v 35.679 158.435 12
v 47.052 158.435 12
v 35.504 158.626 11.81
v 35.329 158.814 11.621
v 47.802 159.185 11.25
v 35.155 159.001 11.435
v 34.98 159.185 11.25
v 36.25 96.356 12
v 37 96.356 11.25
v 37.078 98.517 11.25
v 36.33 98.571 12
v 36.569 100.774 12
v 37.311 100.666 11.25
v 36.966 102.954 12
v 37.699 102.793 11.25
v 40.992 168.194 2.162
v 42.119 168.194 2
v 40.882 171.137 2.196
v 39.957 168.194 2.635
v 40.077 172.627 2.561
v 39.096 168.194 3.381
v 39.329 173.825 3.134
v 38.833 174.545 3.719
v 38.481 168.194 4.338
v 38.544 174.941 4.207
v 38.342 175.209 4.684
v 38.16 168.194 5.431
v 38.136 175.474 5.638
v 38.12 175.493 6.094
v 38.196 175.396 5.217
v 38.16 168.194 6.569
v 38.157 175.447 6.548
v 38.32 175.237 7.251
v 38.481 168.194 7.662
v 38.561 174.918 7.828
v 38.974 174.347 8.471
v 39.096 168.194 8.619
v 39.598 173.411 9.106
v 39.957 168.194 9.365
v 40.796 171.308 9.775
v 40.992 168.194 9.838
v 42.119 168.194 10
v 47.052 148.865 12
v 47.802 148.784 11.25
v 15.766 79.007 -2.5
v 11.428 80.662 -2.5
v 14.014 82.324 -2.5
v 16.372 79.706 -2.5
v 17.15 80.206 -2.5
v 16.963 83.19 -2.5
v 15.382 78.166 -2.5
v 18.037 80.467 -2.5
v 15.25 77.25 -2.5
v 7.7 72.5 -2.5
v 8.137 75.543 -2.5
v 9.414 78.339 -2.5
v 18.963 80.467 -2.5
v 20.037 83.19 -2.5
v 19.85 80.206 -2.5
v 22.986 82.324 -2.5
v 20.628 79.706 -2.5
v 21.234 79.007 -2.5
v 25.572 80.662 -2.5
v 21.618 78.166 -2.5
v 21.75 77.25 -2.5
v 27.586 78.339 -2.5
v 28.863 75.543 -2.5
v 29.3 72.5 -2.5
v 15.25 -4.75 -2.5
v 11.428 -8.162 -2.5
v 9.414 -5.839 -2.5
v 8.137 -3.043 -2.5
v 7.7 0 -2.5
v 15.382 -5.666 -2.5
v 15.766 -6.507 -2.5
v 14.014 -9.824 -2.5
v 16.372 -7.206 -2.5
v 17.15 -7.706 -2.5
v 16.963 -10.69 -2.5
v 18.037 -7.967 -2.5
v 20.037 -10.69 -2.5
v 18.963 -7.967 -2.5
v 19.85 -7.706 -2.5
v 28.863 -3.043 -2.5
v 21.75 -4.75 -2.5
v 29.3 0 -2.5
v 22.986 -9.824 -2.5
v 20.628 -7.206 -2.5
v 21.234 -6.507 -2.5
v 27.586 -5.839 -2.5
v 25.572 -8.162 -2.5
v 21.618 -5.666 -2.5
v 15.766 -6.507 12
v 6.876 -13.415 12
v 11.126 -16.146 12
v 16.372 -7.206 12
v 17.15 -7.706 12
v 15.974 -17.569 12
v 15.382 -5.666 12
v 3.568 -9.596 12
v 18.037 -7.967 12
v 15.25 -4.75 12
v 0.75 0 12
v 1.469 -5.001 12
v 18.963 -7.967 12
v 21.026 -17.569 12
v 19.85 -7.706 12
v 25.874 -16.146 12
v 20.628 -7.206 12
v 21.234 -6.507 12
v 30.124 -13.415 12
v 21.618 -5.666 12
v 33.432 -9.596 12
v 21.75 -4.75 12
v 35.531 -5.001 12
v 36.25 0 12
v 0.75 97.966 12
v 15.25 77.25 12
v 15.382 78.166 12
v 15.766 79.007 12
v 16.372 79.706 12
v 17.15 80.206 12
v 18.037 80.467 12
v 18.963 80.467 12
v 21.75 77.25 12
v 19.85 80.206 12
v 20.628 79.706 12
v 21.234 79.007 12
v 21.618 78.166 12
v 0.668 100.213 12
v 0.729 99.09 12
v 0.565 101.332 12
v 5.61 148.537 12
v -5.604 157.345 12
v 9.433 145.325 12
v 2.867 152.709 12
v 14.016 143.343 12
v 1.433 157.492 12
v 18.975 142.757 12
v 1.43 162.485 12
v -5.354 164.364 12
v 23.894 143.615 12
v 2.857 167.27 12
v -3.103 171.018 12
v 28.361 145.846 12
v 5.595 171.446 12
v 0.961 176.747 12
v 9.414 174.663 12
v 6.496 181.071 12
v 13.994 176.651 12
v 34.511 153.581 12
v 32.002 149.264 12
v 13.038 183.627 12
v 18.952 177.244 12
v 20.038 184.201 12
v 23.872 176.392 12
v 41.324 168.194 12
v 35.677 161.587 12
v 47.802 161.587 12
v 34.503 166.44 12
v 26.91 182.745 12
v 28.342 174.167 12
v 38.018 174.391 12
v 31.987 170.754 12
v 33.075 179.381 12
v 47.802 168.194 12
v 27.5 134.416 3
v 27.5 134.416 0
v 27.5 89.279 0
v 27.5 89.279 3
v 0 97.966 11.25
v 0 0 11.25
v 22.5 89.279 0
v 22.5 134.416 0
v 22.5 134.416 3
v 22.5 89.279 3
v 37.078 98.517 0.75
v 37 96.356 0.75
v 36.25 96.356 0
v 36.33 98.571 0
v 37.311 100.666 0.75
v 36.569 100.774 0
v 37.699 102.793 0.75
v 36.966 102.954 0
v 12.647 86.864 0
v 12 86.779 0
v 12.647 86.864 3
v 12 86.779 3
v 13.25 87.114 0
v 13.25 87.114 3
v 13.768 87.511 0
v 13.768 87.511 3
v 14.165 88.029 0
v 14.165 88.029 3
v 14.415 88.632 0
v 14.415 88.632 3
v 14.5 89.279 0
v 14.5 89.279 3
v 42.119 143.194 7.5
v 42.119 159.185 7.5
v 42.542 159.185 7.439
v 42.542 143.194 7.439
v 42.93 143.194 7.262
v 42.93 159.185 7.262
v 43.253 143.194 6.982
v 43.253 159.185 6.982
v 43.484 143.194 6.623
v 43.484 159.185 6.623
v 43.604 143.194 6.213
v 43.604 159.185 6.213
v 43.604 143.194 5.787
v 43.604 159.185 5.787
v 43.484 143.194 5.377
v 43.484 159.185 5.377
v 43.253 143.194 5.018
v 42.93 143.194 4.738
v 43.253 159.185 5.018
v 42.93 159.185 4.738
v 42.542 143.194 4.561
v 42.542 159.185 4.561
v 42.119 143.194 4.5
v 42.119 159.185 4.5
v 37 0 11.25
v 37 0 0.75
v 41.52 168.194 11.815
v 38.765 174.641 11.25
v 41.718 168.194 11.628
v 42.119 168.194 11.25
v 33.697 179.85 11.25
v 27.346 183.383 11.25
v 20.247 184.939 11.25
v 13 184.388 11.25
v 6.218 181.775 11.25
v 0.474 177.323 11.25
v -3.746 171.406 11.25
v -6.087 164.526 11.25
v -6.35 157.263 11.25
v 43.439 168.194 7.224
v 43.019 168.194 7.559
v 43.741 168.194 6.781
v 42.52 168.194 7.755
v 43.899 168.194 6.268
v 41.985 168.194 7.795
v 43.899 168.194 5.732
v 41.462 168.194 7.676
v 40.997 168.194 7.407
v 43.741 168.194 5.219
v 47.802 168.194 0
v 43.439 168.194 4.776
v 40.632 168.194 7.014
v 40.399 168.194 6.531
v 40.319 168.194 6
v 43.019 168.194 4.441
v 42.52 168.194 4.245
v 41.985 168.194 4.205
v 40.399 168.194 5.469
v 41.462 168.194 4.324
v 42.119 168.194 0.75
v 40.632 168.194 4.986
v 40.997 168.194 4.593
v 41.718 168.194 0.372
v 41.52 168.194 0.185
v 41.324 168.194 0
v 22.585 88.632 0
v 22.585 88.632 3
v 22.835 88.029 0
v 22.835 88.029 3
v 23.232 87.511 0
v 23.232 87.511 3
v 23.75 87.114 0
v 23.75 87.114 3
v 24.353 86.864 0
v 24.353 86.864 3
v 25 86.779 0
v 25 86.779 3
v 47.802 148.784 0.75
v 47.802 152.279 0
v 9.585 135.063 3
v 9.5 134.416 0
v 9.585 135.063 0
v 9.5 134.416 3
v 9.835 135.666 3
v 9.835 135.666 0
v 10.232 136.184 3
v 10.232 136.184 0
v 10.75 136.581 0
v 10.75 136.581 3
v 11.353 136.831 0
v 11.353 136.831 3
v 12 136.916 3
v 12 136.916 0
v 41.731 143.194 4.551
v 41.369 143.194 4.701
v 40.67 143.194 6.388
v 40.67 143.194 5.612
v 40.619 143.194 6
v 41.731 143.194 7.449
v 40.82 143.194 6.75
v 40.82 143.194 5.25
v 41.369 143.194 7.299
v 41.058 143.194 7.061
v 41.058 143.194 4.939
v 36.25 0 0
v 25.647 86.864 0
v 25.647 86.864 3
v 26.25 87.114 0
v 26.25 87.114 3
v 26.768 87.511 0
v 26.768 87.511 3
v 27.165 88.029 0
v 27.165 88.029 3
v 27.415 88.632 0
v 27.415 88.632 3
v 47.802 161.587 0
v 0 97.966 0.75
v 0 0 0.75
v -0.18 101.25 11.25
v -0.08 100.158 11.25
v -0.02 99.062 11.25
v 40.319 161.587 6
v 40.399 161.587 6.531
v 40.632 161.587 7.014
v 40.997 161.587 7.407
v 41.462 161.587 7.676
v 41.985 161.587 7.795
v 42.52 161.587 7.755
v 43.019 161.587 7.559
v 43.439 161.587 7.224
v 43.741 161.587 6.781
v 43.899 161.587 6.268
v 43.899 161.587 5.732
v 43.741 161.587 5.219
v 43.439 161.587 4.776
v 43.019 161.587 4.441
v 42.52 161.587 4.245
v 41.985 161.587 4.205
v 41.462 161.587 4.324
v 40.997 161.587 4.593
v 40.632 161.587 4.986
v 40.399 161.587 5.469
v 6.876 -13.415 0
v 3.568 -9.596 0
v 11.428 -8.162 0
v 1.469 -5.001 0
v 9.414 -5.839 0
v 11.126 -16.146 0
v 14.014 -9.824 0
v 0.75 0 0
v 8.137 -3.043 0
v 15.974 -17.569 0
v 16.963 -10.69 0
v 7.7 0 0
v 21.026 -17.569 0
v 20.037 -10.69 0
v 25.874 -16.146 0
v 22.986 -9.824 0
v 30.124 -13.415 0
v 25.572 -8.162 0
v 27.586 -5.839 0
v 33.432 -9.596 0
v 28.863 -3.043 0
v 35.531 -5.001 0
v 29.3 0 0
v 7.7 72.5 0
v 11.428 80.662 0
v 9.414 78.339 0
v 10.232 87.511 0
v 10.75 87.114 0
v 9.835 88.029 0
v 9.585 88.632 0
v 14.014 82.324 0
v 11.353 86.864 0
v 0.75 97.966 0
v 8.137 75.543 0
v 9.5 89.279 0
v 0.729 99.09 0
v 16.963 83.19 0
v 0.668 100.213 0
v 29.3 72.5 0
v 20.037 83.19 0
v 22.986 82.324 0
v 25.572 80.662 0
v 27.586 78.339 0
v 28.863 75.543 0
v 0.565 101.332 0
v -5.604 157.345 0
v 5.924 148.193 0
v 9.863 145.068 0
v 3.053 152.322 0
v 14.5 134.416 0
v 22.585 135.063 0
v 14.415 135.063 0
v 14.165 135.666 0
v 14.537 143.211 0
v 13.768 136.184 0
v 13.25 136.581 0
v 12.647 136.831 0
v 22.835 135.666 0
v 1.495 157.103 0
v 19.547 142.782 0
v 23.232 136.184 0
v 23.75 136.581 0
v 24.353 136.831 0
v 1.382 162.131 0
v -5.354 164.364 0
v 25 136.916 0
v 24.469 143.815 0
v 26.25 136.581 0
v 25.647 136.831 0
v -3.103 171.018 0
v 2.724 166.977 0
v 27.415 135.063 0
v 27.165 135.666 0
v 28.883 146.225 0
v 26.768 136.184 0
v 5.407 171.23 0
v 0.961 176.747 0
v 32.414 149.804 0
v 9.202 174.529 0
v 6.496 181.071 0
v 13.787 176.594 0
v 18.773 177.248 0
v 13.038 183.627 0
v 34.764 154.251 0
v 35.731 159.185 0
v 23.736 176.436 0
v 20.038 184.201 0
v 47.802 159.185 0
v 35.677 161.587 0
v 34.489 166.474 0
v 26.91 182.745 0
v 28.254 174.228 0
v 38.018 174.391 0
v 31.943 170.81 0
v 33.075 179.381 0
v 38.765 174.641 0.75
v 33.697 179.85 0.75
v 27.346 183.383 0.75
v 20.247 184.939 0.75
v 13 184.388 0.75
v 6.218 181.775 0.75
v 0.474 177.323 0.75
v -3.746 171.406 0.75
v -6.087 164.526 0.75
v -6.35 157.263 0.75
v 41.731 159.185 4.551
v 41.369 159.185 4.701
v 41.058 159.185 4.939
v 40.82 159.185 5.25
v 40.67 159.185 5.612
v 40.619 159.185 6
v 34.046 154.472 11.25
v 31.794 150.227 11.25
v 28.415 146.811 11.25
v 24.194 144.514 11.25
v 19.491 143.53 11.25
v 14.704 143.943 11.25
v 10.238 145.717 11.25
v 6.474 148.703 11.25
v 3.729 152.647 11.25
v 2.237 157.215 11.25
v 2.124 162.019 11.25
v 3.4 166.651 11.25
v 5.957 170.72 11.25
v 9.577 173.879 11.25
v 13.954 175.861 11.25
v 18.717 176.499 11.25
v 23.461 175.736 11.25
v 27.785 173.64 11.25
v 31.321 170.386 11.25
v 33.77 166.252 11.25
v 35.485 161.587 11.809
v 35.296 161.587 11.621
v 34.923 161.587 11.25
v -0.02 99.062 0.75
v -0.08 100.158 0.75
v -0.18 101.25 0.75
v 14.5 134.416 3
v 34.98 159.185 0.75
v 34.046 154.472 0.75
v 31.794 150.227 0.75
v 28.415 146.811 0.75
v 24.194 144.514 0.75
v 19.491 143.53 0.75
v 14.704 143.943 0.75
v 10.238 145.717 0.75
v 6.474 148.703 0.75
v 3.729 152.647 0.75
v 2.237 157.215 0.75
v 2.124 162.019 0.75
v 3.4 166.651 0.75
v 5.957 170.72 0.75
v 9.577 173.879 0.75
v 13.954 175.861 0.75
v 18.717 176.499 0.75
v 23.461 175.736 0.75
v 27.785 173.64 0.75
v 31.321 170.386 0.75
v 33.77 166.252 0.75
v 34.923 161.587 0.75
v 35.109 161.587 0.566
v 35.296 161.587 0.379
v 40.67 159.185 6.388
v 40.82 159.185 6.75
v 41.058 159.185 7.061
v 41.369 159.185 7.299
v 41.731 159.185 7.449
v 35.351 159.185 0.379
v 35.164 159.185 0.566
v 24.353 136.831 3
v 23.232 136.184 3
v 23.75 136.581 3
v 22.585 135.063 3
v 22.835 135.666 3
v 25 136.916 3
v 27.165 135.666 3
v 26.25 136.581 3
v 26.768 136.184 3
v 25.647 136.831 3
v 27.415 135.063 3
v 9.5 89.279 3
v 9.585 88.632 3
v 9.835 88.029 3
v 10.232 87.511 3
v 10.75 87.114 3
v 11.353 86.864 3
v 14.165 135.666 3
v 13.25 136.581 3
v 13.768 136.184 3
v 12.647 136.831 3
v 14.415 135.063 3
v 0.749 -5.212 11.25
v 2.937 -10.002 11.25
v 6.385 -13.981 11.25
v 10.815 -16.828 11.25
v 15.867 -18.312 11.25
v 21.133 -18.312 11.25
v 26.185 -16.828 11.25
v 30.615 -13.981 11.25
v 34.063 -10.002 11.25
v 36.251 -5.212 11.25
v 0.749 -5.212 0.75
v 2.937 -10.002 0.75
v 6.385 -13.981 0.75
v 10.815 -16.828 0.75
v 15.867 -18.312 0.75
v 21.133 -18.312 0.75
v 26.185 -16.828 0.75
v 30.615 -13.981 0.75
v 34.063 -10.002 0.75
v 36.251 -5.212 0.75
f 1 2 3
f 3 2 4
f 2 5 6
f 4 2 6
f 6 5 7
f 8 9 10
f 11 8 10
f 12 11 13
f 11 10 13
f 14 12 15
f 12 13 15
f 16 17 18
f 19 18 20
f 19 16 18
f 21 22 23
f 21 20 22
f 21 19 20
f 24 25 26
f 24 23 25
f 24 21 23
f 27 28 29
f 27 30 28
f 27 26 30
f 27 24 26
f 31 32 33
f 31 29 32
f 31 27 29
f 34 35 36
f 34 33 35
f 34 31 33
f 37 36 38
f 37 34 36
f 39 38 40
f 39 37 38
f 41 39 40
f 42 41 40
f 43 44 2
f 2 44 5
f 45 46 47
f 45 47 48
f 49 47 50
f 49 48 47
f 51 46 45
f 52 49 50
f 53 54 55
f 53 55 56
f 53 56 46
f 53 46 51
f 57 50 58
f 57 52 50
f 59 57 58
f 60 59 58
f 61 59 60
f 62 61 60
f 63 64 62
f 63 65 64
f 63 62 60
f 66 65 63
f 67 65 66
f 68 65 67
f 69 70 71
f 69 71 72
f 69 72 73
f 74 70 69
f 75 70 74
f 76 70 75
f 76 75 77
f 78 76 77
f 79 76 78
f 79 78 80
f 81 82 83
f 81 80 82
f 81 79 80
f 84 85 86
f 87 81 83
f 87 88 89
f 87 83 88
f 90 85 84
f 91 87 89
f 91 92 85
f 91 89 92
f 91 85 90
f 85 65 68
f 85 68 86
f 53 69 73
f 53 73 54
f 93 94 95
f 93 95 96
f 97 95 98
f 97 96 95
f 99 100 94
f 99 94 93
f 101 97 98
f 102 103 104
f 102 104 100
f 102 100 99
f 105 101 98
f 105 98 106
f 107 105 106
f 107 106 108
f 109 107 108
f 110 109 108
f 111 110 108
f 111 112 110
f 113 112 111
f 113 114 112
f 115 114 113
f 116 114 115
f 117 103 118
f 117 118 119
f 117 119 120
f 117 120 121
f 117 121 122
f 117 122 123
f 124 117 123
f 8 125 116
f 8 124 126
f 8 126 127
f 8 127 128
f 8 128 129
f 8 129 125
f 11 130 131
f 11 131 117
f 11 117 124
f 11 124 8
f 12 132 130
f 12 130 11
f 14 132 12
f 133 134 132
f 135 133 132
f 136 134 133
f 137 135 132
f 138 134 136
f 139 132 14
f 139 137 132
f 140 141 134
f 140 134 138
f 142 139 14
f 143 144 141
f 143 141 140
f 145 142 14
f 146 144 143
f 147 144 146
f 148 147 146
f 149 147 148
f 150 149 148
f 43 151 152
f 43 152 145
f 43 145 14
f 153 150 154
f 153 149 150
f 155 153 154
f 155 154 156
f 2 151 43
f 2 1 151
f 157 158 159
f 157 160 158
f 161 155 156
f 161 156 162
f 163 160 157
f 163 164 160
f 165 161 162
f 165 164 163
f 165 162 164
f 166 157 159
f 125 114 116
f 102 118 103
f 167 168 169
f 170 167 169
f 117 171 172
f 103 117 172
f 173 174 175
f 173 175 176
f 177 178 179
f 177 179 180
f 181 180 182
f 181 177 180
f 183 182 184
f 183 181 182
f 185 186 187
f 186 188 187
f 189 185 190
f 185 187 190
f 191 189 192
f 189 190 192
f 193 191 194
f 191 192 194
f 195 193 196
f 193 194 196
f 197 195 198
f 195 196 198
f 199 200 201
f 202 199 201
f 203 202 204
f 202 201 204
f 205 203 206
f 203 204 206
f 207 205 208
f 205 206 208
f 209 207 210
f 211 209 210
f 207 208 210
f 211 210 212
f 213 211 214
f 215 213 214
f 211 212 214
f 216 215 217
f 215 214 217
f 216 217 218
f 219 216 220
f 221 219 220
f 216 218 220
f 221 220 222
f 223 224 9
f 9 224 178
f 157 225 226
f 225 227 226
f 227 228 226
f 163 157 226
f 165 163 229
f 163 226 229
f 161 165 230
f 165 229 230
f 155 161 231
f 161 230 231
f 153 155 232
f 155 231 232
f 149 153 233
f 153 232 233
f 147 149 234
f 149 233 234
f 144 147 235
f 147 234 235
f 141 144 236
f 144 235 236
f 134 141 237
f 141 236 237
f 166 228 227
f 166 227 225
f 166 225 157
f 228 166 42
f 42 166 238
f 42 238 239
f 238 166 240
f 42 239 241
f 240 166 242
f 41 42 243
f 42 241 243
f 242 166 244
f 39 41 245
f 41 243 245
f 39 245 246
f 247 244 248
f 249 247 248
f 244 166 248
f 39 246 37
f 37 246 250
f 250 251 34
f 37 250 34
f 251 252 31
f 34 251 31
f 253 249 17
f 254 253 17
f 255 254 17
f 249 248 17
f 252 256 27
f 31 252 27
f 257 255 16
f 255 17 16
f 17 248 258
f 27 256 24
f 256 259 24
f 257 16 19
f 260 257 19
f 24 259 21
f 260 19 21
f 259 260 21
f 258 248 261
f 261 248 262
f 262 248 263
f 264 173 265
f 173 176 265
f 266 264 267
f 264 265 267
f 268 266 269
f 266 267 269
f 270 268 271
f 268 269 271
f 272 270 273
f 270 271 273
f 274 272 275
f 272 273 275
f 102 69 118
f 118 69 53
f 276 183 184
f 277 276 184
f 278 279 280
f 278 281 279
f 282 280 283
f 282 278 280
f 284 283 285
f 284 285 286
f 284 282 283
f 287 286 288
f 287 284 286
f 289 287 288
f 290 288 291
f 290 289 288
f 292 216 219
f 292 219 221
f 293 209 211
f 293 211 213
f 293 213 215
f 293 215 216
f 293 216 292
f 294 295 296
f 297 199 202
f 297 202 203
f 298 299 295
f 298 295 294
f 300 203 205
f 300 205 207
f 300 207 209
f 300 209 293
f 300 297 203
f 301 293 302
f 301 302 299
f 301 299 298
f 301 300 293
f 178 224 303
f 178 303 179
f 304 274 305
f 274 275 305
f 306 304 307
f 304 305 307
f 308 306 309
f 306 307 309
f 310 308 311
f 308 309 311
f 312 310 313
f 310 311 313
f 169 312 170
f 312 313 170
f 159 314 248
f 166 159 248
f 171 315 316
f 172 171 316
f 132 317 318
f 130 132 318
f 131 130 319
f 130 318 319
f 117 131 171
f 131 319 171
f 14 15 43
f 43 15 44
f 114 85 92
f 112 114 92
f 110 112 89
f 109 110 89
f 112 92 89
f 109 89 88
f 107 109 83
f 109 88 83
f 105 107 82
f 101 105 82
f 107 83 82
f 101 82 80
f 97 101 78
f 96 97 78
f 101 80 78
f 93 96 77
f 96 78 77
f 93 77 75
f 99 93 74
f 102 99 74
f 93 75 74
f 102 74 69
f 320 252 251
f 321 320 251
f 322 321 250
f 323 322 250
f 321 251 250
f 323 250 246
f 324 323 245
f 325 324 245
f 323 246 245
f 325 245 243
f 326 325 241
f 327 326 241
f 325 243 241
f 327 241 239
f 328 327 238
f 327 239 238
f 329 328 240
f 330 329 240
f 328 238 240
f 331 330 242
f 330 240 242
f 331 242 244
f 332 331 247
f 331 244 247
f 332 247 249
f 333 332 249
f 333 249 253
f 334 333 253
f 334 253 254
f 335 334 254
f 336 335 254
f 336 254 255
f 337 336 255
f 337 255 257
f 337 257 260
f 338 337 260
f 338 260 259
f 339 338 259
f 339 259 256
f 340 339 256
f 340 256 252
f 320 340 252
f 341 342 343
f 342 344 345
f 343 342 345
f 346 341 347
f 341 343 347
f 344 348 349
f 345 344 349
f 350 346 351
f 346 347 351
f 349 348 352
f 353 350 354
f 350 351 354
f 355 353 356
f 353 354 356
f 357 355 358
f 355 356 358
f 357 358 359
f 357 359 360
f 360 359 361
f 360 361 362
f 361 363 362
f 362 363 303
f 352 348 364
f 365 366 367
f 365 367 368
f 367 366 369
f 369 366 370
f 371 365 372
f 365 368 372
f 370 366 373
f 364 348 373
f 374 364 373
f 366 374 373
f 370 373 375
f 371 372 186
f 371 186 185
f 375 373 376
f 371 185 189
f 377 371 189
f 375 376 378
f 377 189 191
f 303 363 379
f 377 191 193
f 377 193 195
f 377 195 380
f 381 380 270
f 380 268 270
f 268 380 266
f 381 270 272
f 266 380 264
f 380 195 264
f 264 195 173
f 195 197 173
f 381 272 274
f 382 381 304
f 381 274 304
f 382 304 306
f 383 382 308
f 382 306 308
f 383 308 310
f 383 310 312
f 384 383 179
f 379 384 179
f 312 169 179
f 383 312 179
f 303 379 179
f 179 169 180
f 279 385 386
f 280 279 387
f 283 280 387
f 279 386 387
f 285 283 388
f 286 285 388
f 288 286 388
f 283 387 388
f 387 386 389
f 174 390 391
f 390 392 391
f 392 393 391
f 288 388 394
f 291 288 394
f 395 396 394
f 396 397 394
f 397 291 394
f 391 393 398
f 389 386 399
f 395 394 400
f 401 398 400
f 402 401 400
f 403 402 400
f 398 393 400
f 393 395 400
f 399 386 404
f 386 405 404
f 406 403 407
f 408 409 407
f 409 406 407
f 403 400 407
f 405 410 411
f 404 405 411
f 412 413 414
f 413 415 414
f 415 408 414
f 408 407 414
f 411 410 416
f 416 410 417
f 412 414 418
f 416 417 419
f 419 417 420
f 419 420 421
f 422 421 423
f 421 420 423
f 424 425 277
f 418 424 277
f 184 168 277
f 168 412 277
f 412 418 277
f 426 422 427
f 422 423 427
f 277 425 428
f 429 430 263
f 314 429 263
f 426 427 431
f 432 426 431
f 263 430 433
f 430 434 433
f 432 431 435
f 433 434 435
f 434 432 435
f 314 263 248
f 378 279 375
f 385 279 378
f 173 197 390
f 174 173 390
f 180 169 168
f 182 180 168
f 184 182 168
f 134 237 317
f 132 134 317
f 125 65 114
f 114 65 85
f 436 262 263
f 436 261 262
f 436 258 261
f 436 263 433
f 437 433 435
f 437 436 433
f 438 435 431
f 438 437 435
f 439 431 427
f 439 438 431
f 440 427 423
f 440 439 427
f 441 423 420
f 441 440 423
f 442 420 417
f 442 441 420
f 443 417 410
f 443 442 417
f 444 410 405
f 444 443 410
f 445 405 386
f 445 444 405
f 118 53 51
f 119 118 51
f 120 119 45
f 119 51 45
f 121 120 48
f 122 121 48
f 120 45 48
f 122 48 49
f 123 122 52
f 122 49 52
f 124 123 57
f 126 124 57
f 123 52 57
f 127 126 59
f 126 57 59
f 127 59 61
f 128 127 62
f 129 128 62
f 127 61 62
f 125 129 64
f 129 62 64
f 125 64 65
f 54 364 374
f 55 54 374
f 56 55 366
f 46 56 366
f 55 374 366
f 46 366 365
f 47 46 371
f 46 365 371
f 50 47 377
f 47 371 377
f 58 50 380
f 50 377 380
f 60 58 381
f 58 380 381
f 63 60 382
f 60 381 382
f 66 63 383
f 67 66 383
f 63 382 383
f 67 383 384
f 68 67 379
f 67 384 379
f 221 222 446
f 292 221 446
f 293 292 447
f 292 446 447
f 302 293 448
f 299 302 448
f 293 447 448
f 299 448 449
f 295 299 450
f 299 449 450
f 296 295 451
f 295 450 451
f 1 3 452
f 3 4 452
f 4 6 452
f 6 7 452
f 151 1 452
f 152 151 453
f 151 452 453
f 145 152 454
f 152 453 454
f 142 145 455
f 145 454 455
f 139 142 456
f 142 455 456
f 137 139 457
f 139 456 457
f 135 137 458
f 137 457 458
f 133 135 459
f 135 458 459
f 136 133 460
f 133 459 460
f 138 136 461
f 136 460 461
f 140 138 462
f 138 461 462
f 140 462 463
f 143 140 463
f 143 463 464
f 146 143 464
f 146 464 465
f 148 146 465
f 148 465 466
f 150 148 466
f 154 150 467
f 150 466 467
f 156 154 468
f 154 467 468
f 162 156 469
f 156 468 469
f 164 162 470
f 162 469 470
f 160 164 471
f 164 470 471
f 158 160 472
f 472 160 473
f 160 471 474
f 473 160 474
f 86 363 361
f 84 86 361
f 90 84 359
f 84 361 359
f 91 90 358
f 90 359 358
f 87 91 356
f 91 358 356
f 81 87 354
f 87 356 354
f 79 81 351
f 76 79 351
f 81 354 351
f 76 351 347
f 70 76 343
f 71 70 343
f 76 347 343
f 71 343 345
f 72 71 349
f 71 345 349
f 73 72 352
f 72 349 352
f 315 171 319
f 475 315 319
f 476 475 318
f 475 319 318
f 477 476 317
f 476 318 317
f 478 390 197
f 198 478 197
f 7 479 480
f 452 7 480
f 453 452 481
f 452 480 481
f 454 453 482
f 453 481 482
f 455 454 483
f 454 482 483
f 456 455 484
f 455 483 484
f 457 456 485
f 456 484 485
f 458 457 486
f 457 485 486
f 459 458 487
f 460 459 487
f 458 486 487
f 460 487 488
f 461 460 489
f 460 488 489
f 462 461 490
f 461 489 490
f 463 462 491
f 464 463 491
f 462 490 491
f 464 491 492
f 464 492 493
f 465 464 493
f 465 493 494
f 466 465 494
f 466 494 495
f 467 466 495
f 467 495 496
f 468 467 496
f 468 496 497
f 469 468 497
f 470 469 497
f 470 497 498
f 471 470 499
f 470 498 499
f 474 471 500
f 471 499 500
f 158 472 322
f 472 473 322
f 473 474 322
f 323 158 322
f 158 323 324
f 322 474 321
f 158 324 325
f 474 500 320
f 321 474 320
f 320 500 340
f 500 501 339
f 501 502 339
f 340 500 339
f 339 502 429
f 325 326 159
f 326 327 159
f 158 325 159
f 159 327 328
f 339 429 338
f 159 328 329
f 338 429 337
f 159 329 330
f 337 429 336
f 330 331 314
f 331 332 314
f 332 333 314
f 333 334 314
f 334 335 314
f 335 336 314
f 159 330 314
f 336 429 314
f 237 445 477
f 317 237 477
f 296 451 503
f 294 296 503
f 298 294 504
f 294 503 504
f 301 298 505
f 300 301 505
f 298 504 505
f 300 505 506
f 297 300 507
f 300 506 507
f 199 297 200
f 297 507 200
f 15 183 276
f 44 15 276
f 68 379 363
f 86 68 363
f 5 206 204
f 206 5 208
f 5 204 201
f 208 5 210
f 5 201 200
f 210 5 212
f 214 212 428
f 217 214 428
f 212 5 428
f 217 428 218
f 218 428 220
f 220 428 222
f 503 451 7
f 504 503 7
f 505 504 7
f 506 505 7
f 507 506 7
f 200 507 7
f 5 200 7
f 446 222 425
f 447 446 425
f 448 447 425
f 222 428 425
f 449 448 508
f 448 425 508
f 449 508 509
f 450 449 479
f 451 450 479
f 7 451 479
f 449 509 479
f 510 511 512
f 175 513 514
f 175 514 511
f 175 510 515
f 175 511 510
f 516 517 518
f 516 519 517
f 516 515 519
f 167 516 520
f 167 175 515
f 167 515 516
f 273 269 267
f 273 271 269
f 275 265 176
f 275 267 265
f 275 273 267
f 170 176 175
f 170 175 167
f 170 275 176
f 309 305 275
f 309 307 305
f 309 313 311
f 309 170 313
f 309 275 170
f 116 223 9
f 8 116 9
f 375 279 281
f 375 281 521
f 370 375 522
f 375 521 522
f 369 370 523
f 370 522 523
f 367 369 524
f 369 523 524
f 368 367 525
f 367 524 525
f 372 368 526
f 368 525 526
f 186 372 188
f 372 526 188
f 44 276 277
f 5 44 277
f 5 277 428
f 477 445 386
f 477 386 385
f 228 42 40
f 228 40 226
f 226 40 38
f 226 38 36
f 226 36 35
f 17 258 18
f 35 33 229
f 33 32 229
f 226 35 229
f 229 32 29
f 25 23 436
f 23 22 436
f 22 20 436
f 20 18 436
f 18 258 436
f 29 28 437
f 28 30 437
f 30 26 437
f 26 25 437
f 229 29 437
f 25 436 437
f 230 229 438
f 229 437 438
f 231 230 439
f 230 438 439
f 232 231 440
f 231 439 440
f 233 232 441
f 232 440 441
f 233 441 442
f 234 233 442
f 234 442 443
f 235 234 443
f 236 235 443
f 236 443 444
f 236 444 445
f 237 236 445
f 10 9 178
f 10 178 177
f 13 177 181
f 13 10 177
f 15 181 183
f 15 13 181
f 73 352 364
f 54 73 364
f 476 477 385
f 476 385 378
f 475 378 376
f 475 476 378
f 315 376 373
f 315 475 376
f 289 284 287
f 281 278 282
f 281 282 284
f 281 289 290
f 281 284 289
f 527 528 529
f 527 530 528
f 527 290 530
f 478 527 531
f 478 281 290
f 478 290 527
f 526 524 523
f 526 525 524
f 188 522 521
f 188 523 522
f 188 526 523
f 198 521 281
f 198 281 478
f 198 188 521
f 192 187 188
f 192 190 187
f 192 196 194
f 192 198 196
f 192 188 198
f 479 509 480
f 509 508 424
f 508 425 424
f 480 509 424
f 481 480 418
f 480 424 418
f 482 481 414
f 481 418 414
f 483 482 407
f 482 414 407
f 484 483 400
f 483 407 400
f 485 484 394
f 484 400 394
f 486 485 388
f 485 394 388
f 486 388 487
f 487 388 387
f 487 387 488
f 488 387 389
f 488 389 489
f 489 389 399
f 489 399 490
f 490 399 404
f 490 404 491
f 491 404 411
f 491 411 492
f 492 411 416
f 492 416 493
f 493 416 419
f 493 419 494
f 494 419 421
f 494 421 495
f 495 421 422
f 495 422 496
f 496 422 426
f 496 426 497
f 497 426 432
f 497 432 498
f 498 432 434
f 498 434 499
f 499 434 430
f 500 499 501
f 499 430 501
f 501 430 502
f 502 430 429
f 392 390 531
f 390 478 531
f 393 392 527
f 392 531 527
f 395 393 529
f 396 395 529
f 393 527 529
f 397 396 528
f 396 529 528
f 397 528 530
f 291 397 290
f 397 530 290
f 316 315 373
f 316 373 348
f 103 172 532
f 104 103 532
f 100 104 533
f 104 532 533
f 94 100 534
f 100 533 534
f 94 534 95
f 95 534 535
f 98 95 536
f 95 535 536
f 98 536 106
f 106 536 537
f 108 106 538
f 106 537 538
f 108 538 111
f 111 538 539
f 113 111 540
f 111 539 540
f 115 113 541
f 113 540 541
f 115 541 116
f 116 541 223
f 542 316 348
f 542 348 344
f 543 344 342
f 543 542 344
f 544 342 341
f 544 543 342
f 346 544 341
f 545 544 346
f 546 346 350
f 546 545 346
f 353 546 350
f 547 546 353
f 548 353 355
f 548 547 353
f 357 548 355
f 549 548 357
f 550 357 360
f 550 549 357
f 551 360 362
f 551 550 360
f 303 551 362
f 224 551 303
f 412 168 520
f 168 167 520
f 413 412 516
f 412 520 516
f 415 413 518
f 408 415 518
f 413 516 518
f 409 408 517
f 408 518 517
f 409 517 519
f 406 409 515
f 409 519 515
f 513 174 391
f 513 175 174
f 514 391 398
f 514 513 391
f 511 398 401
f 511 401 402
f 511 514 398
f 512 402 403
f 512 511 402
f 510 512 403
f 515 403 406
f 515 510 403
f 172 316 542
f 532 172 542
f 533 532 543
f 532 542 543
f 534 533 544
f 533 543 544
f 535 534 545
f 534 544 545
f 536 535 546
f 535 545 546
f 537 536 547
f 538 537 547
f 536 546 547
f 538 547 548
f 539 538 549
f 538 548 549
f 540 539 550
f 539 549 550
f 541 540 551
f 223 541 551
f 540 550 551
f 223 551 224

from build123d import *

# Parameters (mm, degrees)
F1_DEPTH      = 12
F3_DEPTH      = 2.5
F5_DEPTH      = 25
F6_R          = 30
F8_DEPTH      = 25
F8_DEPTH_BACK = 25
F9_R          = 4
F10_DEPTH     = 25
F11_R         = 1.8
F12_DEPTH     = 7.5
F13_SIZE      = 0.75
F14_SIZE      = 0.75
F15_SIZE      = 0.75
F16_W         = 5
F16_H         = 50.1374751329
F17_DEPTH     = 3
F18_R         = 2.49999


# Not quite as in the source:
# - a fillet or chamfer is up to 0.001 mm smaller than in the source, because OpenCascade refuses the exact size


with BuildPart() as f1:
    # F0 (on Top) → F1 (new body)
    with BuildSketch(Plane.XY):
        with BuildLine():
            Line((-3.74e-08, 99.6128183121), (0, 0))
            ThreePointArc((0, 0), (18.500000007, -18.499999993), (37, 1.39e-08))
            Line((37, 1.39e-08), (36.9999999626, 99.6128183121))
            Line((36.9999999626, 99.6128183121), (47.8017579937, 148.7838923931))
            Line((47.8017579937, 148.7838923931), (47.8017579937, 159.1853948904))
            Line((47.8017579937, 159.1853948904), (34.9798792017, 159.1853948904))
            ThreePointArc((34.9798792017, 159.1853948904), (2.004546746, 159.6126733438), (34.9234827971, 161.5872028336))
            Line((34.9234827971, 161.5872028336), (47.8017579834, 161.5872028336))
            Line((47.8017579834, 161.5872028336), (47.8017578313, 168.1936387276))
            Line((47.8017578313, 168.1936387276), (42.1191508, 168.1936387276))
            ThreePointArc((42.1191508, 168.1936387276), (13.0001519828, 184.387531079), (-6.3497242683, 157.2629936512))
            Line((-6.3497242683, 157.2629936512), (-3.74e-08, 99.6128183121))
        make_face()
    extrude(amount=F1_DEPTH)

    # F2 (on face) → F3 (join)
    with BuildSketch(Plane(origin=(0, 0, 0), x_dir=(1, 0, 0), z_dir=(0, 0, -1))):
        with BuildLine():
            ThreePointArc((29.3, -7e-09), (18.5, 10.799999993), (7.7, -7e-09))
            Line((7.7, -7e-09), (7.7, -72.500000007))
            ThreePointArc((7.7, -72.500000007), (18.5, -83.300000007), (29.3, -72.500000007))
            Line((29.3, -72.500000007), (29.3, -7e-09))
        make_face()
    extrude(amount=F3_DEPTH)

    # F4 (on face) → F5 (cut)
    with BuildSketch(Plane(origin=(0, 0, -2.5), x_dir=(1, 0, 0), z_dir=(0, 0, -1))):
        with BuildLine():
            ThreePointArc((21.75, 4.749999993), (18.5, 7.999999993), (15.25, 4.749999993))
            Line((15.25, 4.749999993), (15.25, -77.250000007))
            ThreePointArc((15.25, -77.250000007), (18.5, -80.500000007), (21.75, -77.250000007))
            Line((21.75, -77.250000007), (21.75, 4.749999993))
        make_face()
    extrude(amount=-F5_DEPTH, mode=Mode.SUBTRACT)

    # F6
    f6_edges = [f1.edges().sort_by_distance(p)[0] for p in [
        (0, 99.612818, 6),
        (37, 99.612818, 6),
    ]]
    fillet(f6_edges, radius=F6_R)

    # F7 (on face) → F8 (cut, two sides)
    with BuildSketch(Plane(origin=(0, 168.1936387276, 0), x_dir=(-1, 0, 0), z_dir=(0, 1, 0))) as f8_sk:
        with BuildLine():
            ThreePointArc((-42.1191508, 4.5), (-41.0584906283, 4.9393398282), (-40.6191508, 6))
            ThreePointArc((-40.6191508, 6), (-41.0584906283, 7.0606601718), (-42.1191508, 7.5))
            Line((-42.1191508, 7.5), (-42.1191508, 4.5))
        make_face()
        with BuildLine():
            Line((-42.1191508, 4.5), (-42.1191508, 7.5))
            ThreePointArc((-42.1191508, 7.5), (-43.6191508, 6), (-42.1191508, 4.5))
        make_face()
    extrude(amount=-F8_DEPTH, mode=Mode.SUBTRACT)
    extrude(f8_sk.sketch, amount=F8_DEPTH_BACK, mode=Mode.SUBTRACT)

    # F9 (on face) → F10 (cut)
    with BuildSketch(Plane(origin=(0, 168.1936387276, 0), x_dir=(-1, 0, 0), z_dir=(0, 1, 0))):
        with Locations((-42.1191508, 6)):
            Circle(F9_R)
    extrude(amount=F10_DEPTH, mode=Mode.SUBTRACT)

    # F11 (on face) → F12 (cut)
    with BuildSketch(Plane(origin=(0, 168.1936387276, 0), x_dir=(-1, 0, 0), z_dir=(0, 1, 0))):
        with Locations((-42.1191508, 6)):
            Circle(F11_R)
    extrude(amount=-F12_DEPTH, mode=Mode.SUBTRACT)

    # F13
    f13_edges = [f1.edges().sort_by_distance(p)[0] for p in [
        (37, 48.178243, 12),
        (41.390819, 159.185395, 12),
        (2.004547, 159.612673, 12),
        (47.801758, 153.984644, 12),
    ]]
    chamfer(f13_edges, length=F13_SIZE)

    # F14
    f14_edges = [f1.edges().sort_by_distance(p)[0] for p in [
        (2.004547, 159.612673, 0),
    ]]
    chamfer(f14_edges, length=F14_SIZE)

    # F15
    f15_edges = [f1.edges().sort_by_distance(p)[0] for p in [
        (42.75022, 125.788603, 0),
        (13.000152, 184.387531, 0),
        (-3.265028, 129.256533, 0),
        (37.175182, 99.593803, 0),
        (-0.045117, 99.610341, 0),
        (37, 48.178243, 0),
        (0, 48.982832, 0),
        (18.5, -18.5, 0),
    ]]
    chamfer(f15_edges, length=F15_SIZE)

    # F16 (on face) → F17 (cut)
    with BuildSketch(Plane(origin=(0, 0, 0), x_dir=(1, 0, 0), z_dir=(0, 0, -1))):
        with Locations((25, -111.8474081159)):
            Rectangle(F16_W, F16_H)
        with Locations((12, -111.8474081159)):
            Rectangle(F16_W, F16_H)
    extrude(amount=-F17_DEPTH, mode=Mode.SUBTRACT)

    # F18 (radius 2.5 in the source; OpenCascade refuses exactly that, so slightly less here)
    f18_edges = [f1.edges().sort_by_distance(p)[0] for p in [
        (22.5, 136.916146, 1.5),
        (27.5, 136.916146, 1.5),
        (14.5, 136.916146, 1.5),
        (9.5, 136.916146, 1.5),
        (9.5, 86.778671, 1.5),
        (14.5, 86.778671, 1.5),
        (27.5, 86.778671, 1.5),
        (22.5, 86.778671, 1.5),
    ]]
    fillet(f18_edges, radius=F18_R)


solid = f1.part
